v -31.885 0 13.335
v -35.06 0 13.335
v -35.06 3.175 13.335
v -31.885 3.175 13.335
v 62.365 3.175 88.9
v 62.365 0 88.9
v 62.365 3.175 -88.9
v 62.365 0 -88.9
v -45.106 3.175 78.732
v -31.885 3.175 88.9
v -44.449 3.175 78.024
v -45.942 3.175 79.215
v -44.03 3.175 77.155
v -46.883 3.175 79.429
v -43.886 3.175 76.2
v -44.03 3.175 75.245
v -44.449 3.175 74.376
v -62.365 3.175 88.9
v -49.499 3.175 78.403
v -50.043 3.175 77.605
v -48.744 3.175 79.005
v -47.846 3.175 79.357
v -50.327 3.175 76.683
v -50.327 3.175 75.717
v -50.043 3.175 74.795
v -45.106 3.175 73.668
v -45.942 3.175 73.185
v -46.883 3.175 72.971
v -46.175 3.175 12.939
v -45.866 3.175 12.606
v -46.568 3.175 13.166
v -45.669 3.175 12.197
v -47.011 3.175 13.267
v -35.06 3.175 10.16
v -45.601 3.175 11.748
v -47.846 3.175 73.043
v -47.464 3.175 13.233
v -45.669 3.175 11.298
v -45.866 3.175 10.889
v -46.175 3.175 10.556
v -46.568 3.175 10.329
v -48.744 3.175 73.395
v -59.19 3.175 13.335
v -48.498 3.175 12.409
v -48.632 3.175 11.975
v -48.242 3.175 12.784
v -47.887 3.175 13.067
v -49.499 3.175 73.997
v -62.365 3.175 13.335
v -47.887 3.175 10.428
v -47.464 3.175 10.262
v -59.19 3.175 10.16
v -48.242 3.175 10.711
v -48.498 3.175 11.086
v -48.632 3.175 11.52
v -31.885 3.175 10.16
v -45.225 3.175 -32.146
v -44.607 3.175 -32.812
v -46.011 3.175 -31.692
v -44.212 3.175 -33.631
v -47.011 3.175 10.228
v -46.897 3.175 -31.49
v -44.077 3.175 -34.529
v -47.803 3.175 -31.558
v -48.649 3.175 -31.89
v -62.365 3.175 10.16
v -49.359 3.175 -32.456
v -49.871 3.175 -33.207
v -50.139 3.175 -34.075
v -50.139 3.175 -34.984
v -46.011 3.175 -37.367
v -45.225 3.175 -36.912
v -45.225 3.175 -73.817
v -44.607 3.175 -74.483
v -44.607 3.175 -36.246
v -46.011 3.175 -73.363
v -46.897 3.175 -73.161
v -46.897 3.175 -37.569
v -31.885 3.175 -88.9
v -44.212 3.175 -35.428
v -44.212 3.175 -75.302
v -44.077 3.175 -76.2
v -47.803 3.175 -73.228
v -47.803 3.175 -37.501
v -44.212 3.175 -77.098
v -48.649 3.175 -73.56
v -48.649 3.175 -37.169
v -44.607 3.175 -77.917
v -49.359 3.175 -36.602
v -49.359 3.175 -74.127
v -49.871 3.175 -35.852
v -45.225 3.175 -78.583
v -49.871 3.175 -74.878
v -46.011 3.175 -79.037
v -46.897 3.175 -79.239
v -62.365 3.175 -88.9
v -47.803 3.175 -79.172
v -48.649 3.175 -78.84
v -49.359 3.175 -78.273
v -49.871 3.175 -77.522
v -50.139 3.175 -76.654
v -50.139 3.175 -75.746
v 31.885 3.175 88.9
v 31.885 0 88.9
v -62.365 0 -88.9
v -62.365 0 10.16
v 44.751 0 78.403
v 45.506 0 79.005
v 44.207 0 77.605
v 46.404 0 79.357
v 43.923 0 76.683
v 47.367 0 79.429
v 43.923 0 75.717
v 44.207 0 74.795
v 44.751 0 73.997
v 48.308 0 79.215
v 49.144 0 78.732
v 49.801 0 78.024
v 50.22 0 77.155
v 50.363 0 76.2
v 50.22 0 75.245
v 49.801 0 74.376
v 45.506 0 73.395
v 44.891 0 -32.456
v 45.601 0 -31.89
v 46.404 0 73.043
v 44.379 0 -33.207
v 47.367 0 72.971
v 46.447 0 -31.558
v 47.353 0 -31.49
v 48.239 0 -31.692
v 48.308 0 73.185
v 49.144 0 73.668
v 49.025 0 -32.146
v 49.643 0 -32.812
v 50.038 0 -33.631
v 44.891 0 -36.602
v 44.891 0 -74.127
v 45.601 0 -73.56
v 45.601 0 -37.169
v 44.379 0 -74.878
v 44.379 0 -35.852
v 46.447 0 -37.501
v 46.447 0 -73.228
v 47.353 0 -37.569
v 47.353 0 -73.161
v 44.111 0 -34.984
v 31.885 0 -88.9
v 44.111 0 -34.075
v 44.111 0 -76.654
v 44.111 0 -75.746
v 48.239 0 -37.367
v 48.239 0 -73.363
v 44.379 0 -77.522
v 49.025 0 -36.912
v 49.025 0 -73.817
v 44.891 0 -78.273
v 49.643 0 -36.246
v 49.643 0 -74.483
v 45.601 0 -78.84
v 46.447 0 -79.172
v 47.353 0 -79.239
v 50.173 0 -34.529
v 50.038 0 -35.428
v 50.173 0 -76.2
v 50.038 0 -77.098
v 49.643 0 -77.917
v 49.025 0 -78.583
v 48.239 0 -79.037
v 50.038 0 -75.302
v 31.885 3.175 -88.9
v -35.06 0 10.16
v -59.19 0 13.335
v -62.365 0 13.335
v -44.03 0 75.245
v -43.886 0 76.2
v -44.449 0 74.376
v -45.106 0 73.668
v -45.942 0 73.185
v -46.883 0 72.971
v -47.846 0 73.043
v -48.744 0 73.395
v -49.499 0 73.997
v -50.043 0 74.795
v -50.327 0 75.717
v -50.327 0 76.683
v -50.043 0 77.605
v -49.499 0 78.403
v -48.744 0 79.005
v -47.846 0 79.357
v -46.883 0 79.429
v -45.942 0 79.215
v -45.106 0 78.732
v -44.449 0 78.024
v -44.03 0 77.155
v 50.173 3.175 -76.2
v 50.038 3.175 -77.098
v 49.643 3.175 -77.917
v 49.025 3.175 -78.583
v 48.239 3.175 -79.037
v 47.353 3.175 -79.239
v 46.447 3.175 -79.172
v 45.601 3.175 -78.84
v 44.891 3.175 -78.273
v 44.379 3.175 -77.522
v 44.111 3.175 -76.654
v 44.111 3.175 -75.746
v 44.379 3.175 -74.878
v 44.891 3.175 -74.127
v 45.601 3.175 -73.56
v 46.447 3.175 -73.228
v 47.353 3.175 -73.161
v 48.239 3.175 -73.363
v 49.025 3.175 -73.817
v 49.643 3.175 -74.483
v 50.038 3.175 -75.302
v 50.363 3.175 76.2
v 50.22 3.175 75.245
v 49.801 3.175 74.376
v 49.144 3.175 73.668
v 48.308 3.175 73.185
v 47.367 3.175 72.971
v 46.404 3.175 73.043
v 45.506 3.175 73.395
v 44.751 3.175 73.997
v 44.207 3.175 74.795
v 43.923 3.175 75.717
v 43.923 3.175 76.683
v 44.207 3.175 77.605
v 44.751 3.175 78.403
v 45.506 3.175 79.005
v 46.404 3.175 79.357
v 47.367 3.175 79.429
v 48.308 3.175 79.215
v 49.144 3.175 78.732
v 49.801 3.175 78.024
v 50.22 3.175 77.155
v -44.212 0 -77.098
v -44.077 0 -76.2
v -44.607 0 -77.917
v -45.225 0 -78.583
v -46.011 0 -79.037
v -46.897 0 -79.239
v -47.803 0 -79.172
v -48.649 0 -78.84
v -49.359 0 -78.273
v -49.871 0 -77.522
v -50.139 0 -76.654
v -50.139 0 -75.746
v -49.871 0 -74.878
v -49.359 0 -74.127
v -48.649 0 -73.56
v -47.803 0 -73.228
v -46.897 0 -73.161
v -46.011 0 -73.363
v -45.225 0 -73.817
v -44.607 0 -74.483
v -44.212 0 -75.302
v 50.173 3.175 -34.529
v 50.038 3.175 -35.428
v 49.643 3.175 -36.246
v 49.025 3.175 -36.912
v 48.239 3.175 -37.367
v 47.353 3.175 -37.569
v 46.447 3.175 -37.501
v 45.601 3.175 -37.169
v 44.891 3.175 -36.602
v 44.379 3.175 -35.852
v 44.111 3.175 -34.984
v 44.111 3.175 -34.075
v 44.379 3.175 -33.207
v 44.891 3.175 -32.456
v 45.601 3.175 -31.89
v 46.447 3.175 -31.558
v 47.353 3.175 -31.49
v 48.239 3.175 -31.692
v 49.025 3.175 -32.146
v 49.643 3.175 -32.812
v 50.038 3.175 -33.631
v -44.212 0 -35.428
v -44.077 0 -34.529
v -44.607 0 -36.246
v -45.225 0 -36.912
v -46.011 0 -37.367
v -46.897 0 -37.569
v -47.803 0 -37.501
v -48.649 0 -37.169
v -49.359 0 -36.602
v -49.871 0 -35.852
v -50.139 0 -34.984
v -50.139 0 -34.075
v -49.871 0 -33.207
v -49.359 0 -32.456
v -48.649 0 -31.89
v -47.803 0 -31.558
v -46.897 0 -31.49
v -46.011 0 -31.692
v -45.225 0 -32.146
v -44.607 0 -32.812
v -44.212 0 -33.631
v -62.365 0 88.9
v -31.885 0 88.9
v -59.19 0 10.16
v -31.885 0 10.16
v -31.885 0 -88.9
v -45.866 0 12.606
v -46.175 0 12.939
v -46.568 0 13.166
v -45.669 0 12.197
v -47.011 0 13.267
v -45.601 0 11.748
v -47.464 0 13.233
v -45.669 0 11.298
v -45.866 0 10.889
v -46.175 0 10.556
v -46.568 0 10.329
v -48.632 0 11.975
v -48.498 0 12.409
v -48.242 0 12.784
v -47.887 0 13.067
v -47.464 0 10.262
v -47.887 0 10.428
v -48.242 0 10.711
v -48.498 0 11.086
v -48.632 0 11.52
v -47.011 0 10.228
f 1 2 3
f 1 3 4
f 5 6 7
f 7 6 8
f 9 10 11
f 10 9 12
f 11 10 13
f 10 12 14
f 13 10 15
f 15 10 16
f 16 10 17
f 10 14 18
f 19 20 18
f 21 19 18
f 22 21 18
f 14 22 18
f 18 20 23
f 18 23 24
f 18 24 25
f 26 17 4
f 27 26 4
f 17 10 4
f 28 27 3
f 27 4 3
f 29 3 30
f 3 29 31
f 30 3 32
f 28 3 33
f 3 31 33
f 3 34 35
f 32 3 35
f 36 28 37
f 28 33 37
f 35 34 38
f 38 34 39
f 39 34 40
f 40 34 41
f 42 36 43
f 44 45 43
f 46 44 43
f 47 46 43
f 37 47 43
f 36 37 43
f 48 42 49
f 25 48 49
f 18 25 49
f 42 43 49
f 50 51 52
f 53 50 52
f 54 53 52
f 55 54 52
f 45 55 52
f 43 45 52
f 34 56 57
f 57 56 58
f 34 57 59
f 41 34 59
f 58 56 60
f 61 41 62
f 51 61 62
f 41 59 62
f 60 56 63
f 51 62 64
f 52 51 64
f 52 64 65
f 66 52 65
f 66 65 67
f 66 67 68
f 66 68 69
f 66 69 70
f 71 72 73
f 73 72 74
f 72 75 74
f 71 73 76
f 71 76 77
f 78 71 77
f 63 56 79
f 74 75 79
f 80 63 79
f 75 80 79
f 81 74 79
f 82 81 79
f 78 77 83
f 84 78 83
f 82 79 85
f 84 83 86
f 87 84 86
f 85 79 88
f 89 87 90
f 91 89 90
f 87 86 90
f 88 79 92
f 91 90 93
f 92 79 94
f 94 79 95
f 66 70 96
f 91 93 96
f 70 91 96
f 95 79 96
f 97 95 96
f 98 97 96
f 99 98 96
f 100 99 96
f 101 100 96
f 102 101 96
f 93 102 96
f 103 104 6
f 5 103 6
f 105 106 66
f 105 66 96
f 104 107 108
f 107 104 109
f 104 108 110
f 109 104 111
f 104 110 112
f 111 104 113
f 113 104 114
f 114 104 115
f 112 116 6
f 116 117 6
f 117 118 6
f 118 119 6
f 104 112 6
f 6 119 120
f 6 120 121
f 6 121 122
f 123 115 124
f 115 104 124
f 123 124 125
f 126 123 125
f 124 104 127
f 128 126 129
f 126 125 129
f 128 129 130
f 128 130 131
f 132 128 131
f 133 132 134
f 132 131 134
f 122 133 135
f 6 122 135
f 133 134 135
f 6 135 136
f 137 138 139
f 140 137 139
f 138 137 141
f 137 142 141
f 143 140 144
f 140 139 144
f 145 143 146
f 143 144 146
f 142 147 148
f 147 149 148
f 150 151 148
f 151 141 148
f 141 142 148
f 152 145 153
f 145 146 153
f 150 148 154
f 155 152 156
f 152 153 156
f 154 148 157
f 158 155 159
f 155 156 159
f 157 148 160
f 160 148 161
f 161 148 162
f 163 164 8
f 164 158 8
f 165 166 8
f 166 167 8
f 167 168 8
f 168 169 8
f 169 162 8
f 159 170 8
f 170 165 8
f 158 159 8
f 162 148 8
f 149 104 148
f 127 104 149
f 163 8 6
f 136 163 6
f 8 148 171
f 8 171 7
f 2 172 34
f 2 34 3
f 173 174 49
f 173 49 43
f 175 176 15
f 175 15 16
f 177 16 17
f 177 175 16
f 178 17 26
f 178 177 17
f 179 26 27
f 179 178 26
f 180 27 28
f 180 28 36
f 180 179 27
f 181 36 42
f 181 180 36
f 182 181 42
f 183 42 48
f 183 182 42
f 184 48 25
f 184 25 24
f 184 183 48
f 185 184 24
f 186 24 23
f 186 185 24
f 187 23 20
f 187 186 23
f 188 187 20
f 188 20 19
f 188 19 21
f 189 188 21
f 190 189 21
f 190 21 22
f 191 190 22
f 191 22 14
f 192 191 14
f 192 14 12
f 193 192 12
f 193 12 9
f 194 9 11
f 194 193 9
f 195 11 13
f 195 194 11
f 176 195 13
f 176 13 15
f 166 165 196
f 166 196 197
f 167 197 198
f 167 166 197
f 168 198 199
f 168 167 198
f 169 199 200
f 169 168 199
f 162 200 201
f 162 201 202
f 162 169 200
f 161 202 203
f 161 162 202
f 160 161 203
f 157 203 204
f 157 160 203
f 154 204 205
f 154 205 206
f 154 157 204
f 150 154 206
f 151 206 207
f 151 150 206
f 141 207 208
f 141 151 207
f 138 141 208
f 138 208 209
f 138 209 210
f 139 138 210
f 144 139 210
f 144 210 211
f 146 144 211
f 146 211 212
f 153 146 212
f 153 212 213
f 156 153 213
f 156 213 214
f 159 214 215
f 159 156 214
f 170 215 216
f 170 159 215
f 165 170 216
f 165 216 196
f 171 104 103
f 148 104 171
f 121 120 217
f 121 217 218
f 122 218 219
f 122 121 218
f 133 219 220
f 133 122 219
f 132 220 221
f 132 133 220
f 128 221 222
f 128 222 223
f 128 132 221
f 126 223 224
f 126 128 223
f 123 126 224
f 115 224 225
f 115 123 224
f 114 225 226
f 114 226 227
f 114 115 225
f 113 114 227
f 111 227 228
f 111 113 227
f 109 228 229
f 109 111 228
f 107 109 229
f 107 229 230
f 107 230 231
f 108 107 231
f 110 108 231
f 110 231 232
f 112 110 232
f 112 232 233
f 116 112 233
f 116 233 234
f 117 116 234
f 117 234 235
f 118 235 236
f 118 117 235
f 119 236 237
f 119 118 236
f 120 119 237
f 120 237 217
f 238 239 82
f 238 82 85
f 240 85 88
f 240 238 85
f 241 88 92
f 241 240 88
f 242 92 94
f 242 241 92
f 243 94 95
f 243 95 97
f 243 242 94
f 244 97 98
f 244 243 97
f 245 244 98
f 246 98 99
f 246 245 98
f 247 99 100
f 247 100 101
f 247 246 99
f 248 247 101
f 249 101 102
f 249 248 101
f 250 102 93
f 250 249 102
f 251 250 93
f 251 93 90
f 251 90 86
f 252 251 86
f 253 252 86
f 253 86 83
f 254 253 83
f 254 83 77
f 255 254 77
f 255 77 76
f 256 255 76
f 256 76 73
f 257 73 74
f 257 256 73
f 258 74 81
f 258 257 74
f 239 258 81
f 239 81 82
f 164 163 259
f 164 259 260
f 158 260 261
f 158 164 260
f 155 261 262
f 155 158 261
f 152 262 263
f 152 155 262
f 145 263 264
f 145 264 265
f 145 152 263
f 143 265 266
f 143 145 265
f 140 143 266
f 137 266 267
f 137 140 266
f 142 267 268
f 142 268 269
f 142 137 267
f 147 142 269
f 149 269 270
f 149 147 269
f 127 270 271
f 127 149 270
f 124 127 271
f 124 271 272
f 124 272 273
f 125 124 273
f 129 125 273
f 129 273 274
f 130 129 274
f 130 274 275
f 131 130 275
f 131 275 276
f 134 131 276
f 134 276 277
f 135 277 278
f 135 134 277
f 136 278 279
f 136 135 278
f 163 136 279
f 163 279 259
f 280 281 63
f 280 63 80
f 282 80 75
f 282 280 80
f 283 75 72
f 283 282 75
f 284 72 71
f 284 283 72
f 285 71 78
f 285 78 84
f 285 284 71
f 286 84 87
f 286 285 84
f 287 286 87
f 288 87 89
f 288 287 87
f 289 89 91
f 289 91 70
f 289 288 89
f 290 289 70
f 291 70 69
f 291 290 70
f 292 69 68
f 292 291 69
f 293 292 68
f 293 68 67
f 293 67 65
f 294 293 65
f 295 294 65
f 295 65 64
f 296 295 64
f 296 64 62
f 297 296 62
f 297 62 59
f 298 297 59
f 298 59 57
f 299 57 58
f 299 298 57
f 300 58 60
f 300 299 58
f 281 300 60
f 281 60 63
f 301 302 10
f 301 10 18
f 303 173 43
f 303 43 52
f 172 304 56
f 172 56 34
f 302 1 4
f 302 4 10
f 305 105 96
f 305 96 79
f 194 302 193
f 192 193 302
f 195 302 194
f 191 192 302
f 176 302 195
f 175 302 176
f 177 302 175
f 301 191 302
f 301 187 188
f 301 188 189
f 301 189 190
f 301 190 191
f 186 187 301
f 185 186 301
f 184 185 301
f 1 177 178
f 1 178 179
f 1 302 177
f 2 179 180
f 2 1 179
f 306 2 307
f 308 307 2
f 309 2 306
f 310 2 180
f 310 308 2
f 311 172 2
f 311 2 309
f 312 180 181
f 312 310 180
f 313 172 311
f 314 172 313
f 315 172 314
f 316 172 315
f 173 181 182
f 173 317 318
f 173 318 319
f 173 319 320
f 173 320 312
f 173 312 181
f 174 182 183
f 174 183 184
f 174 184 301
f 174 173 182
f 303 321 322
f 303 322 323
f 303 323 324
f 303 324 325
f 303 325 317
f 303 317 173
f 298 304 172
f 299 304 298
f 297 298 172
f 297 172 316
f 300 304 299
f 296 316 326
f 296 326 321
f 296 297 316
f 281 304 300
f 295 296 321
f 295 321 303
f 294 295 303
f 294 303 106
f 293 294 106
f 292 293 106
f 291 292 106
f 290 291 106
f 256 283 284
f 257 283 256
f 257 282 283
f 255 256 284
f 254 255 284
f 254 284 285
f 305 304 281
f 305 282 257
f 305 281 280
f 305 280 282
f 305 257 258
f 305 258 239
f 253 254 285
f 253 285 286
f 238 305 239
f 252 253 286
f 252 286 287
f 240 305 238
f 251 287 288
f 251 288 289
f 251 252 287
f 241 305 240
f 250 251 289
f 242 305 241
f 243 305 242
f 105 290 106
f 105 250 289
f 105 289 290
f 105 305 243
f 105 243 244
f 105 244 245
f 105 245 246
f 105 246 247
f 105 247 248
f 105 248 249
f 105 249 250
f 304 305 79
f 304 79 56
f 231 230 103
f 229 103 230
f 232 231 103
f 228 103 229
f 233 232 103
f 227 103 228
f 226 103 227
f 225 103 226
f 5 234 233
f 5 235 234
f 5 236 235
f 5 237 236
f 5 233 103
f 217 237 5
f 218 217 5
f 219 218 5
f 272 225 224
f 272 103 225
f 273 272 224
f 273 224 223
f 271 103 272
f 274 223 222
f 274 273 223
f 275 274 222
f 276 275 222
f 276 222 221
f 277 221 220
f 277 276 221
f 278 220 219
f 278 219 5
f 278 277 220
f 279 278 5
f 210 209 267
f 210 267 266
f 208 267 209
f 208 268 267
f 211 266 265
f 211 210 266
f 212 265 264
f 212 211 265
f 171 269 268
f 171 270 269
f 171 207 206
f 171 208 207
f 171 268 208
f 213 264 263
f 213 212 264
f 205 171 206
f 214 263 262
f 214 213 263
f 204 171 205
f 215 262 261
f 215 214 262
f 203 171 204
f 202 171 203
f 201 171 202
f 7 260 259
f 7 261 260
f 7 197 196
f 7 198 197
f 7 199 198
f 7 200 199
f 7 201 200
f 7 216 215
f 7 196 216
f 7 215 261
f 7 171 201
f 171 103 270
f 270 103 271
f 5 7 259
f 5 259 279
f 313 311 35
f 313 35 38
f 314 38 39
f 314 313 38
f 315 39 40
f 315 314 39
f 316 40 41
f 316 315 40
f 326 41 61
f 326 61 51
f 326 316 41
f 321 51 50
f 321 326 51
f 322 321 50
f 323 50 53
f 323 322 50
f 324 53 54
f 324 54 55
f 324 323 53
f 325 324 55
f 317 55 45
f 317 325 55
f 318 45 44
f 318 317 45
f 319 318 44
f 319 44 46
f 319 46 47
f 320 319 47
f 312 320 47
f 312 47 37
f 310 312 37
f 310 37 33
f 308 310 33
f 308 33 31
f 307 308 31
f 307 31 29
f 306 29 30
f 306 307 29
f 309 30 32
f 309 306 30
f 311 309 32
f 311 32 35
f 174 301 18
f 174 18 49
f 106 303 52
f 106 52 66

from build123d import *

# Parameters (mm, degrees)
SKETCH1_R             = 1.524
SKETCH1_R_2           = 3.048
SKETCH1_R_3           = 3.2385
BOSS_EXTRUDE1_DEPTH   = 3.175
SKETCH1_W             = 30.48
SKETCH1_H             = 177.8
BOSS_EXTRUDE1_2_DEPTH = 3.175


with BuildPart() as part:
    # Sketch1 → Boss-Extrude1 (new body)
    with BuildSketch(Plane(origin=(0, 0, 0), x_dir=(1, 0, 0), z_dir=(0, 1, 0))):
        Polygon((-31.884999984, 88.9), (-31.884999984, -10.16), (-35.059999984, -10.16), (-35.059999984, -13.335), (-31.884999984, -13.335), (-31.884999984, -88.9), (-62.364999984, -88.9), (-62.364999984, -13.335), (-59.189999984, -13.335), (-59.189999984, -10.16), (-62.364999984, -10.16), (-62.364999984, 88.9), align=None)
        with Locations((-47.124999984, -11.7475)):
            Circle(SKETCH1_R, mode=Mode.SUBTRACT)
        with Locations((-47.124999984, 34.529268)):
            Circle(SKETCH1_R_2, mode=Mode.SUBTRACT)
        with Locations((-47.124999984, 76.2)):
            Circle(SKETCH1_R_2, mode=Mode.SUBTRACT)
        with Locations((-47.124999984, -76.2)):
            Circle(SKETCH1_R_3, mode=Mode.SUBTRACT)
    extrude(amount=BOSS_EXTRUDE1_DEPTH)


with BuildPart() as body_2:
    # Sketch1 → Boss-Extrude1 2 (new body)
    with BuildSketch(Plane(origin=(0, 0, 0), x_dir=(1, 0, 0), z_dir=(0, 1, 0))):
        with Locations((47.124999984, 0)):
            Rectangle(SKETCH1_W, SKETCH1_H)
        with Locations((47.124999984, 76.2)):
            Circle(SKETCH1_R_2, mode=Mode.SUBTRACT)
        with Locations((47.124999984, 34.529268)):
            Circle(SKETCH1_R_2, mode=Mode.SUBTRACT)
        with Locations((47.124999984, -76.2)):
            Circle(SKETCH1_R_3, mode=Mode.SUBTRACT)
    extrude(amount=BOSS_EXTRUDE1_2_DEPTH)


solid = Compound([part.part, body_2.part])
